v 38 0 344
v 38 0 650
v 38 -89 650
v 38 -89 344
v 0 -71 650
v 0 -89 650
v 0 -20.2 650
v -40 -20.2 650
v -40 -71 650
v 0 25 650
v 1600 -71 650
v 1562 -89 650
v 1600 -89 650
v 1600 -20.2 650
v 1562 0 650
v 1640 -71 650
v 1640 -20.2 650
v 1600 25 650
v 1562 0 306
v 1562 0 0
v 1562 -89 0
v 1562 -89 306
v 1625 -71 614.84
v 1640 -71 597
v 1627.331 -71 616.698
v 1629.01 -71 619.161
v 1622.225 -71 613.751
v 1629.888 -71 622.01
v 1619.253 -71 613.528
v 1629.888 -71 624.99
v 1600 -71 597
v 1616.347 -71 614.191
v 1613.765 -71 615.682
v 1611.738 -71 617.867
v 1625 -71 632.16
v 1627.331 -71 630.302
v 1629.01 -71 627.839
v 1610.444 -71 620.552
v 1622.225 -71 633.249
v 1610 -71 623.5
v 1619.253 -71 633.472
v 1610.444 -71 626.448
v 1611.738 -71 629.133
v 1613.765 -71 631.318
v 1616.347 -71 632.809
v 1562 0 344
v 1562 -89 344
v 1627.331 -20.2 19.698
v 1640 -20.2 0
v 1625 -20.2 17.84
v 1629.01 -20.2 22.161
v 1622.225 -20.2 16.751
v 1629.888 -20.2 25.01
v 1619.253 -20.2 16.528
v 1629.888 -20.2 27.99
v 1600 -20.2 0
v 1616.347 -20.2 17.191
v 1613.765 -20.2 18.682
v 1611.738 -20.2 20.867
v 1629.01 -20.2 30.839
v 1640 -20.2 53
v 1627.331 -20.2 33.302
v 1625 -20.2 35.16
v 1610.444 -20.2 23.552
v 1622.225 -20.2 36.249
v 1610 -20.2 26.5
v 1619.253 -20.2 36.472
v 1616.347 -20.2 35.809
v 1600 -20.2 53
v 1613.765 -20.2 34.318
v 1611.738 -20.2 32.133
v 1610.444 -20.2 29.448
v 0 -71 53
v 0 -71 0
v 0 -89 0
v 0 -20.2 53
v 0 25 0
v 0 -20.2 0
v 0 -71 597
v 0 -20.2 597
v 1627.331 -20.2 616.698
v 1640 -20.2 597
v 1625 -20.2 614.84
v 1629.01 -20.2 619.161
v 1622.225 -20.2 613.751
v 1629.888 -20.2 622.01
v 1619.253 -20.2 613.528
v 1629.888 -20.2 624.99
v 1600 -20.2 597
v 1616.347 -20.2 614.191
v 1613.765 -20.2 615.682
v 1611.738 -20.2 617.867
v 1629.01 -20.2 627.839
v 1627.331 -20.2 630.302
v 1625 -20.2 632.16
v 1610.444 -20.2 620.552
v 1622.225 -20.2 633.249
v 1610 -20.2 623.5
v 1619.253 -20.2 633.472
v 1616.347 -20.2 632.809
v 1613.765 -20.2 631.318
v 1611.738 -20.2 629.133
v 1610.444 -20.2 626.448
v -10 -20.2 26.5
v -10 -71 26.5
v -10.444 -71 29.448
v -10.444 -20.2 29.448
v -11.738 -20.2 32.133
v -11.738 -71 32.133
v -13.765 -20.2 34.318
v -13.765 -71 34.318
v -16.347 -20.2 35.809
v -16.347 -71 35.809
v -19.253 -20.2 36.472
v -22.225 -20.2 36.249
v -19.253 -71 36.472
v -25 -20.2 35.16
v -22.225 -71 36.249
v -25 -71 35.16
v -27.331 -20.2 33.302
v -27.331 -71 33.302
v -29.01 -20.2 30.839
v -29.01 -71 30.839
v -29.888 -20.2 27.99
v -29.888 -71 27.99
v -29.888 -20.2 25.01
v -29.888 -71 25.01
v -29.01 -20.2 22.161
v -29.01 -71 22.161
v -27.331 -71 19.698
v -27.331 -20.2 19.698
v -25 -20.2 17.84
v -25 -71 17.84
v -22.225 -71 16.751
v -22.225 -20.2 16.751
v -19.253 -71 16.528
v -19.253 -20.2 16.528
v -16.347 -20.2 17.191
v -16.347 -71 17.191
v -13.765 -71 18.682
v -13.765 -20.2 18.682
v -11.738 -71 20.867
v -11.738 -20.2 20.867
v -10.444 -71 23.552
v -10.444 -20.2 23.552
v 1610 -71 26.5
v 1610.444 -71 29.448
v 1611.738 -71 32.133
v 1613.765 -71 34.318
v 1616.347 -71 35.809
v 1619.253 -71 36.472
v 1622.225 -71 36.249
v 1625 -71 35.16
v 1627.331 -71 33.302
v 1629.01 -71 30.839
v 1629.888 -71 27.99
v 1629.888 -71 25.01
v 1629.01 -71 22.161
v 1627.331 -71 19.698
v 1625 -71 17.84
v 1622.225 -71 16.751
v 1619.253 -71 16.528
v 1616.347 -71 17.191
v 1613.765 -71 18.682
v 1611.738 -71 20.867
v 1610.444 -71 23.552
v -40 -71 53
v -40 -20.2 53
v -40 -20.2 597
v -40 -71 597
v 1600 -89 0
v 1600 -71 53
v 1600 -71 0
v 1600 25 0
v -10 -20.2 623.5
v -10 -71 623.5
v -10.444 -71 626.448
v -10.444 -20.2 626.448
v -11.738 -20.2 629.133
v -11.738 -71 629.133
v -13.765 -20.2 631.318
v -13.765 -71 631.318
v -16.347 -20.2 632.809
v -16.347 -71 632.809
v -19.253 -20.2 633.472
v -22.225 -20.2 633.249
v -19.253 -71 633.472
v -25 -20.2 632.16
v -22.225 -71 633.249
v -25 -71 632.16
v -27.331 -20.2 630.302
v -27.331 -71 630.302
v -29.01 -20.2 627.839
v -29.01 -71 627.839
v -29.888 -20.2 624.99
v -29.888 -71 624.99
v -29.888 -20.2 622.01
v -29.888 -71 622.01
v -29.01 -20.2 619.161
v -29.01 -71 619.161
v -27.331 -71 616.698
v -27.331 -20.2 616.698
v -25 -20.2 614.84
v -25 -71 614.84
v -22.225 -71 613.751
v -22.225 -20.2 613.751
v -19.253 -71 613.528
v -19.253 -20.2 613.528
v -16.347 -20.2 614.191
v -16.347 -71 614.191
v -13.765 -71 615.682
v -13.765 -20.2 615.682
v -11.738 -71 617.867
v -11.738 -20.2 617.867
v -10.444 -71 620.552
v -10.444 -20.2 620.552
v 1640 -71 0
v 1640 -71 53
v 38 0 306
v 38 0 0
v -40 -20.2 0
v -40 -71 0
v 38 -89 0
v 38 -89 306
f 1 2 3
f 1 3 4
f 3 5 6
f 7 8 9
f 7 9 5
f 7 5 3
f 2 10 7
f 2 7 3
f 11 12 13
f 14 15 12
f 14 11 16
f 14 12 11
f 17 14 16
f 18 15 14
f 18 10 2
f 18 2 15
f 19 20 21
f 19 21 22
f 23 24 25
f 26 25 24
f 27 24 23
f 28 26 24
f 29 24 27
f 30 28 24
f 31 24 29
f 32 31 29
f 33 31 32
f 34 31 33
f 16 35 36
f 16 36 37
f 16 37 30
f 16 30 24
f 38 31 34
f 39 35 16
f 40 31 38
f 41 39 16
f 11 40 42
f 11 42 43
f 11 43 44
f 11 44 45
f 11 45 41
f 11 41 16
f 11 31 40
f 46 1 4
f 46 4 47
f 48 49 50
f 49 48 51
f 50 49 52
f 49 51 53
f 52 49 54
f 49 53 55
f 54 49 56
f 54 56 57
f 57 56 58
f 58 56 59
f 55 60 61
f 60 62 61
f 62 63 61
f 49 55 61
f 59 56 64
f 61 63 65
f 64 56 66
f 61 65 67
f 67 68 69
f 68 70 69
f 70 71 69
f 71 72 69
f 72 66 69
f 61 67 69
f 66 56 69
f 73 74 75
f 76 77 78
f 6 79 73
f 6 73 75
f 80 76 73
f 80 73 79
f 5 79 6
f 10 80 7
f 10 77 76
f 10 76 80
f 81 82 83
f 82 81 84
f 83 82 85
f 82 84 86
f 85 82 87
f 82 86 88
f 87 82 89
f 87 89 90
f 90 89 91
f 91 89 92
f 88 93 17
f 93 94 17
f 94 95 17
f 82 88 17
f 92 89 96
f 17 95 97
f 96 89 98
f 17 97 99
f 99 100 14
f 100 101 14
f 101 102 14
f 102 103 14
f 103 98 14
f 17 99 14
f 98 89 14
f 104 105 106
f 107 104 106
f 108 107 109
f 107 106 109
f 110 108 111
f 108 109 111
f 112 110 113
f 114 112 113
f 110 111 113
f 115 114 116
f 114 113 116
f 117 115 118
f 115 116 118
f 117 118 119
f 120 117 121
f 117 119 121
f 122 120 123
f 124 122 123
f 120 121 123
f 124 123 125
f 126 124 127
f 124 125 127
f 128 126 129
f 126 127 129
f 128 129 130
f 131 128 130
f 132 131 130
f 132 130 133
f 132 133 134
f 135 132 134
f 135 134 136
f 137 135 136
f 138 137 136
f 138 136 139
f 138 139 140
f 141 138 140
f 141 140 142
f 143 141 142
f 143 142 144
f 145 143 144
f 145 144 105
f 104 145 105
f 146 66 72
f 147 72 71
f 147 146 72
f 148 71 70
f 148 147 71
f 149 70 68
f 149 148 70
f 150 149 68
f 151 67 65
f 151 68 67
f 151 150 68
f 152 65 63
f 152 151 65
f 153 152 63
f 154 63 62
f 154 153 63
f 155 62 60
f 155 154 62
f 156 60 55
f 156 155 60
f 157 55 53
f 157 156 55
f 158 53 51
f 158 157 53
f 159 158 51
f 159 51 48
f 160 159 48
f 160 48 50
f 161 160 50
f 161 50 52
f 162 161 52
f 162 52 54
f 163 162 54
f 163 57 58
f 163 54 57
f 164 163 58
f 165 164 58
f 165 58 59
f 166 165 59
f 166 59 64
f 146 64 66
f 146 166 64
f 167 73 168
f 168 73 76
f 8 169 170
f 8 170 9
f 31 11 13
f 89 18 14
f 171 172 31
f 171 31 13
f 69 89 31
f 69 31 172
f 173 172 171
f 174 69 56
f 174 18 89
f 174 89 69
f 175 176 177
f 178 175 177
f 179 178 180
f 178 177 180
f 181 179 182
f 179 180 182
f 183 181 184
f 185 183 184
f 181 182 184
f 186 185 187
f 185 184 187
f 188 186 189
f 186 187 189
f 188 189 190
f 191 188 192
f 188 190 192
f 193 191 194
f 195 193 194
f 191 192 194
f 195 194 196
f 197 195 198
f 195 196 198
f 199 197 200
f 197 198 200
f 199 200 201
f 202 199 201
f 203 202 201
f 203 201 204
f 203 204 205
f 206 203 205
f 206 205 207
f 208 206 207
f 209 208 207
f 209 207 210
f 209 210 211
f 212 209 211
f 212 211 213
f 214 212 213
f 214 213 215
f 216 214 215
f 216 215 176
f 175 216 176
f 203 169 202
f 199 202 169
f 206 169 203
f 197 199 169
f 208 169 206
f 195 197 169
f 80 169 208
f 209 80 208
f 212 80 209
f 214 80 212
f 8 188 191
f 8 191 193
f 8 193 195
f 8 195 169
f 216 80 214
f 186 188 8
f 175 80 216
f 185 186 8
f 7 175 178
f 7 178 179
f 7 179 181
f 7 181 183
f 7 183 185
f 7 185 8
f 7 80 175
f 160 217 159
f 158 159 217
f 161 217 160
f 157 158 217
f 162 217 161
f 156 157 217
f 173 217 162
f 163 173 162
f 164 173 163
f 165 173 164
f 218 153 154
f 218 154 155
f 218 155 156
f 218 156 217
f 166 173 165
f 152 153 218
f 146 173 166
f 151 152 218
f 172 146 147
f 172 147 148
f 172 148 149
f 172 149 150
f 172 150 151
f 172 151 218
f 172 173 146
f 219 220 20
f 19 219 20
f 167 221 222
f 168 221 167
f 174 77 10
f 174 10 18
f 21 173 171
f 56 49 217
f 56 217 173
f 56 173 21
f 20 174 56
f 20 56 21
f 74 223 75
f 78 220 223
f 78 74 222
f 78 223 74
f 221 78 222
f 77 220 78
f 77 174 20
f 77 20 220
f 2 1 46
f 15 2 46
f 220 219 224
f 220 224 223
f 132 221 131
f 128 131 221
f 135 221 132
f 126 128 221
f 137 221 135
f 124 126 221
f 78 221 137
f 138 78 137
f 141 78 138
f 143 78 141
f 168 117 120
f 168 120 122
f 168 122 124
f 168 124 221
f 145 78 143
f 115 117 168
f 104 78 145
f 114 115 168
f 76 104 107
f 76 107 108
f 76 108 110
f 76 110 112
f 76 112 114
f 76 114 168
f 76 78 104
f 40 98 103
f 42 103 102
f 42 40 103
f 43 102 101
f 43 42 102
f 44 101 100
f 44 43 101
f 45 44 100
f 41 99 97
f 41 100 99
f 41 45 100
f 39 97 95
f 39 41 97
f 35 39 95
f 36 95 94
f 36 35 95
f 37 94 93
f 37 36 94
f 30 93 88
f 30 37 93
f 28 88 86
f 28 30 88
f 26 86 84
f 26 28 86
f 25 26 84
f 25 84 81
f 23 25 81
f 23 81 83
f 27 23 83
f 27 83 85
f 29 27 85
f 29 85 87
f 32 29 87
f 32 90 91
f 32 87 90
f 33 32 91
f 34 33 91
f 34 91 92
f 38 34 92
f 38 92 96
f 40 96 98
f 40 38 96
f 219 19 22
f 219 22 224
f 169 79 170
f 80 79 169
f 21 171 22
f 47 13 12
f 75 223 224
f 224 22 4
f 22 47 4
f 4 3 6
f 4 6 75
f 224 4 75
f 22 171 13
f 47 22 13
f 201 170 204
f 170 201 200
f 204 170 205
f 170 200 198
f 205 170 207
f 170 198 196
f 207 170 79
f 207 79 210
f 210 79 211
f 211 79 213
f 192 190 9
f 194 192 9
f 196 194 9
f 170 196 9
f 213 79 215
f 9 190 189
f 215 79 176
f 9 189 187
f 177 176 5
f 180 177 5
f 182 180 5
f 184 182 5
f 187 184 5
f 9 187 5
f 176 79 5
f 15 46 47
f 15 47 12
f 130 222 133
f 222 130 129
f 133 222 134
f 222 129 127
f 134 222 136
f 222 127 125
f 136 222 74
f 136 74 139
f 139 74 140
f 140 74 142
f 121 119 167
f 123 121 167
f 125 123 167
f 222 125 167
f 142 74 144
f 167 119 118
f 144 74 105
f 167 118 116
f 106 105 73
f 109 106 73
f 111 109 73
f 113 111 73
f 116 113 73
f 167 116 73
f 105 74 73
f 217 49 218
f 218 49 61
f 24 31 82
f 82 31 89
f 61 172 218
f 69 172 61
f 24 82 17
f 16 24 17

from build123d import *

# Parameters (mm, degrees)
SKETCH1_W           = 1600
SKETCH1_H           = 650
BOSS_EXTRUDE1_DEPTH = 25
BOSS_EXTRUDE2_DEPTH = 89
SKETCH3_W           = 53
SKETCH3_H           = 50.8
BOSS_EXTRUDE3_DEPTH = 40
SKETCH4_R           = 10
CUT_EXTRUDE1_DEPTH  = 129


with BuildPart() as part:
    # Sketch1 → Boss-Extrude1 (new body)
    with BuildSketch(Plane(origin=(0, 0, 0), x_dir=(1, 0, 0), z_dir=(0, 1, 0))):
        with Locations((800, -325)):
            Rectangle(SKETCH1_W, SKETCH1_H)
    extrude(amount=BOSS_EXTRUDE1_DEPTH)

    # Sketch2 → Boss-Extrude2 (add)
    with BuildSketch(Plane.XZ):
        Polygon((38, 306), (38, 0), (0, 0), (0, 650), (38, 650), (38, 344), (1562, 344), (1562, 650), (1600, 650), (1600, 0), (1562, 0), (1562, 306), align=None)
    extrude(amount=BOSS_EXTRUDE2_DEPTH)

    # Sketch3 → Boss-Extrude3 (add)
    with BuildSketch(Plane.ZY):
        with Locations((26.5, -45.6)):
            Rectangle(SKETCH3_W, SKETCH3_H)
        with Locations((623.5, -45.6)):
            Rectangle(SKETCH3_W, SKETCH3_H)
    boss_extrude3 = extrude(amount=BOSS_EXTRUDE3_DEPTH)

    # Sketch4 → Cut-Extrude1 (cut)
    with BuildSketch(Plane.XZ.offset(71)):
        with Locations((-20, 26.5)):
            Circle(SKETCH4_R)
        with Locations((-20, 623.5)):
            Circle(SKETCH4_R)
    cut_extrude1 = extrude(amount=-CUT_EXTRUDE1_DEPTH, mode=Mode.SUBTRACT)

    # Mirror1: Boss-Extrude3, Cut-Extrude1 across plane
    add(boss_extrude3.mirror(Plane(origin=(800, 0, 0), x_dir=(0, 0, 1), z_dir=(1, 0, 0))))
    add(cut_extrude1.mirror(Plane(origin=(800, 0, 0), x_dir=(0, 0, 1), z_dir=(1, 0, 0))), mode=Mode.SUBTRACT)


solid = part.part
